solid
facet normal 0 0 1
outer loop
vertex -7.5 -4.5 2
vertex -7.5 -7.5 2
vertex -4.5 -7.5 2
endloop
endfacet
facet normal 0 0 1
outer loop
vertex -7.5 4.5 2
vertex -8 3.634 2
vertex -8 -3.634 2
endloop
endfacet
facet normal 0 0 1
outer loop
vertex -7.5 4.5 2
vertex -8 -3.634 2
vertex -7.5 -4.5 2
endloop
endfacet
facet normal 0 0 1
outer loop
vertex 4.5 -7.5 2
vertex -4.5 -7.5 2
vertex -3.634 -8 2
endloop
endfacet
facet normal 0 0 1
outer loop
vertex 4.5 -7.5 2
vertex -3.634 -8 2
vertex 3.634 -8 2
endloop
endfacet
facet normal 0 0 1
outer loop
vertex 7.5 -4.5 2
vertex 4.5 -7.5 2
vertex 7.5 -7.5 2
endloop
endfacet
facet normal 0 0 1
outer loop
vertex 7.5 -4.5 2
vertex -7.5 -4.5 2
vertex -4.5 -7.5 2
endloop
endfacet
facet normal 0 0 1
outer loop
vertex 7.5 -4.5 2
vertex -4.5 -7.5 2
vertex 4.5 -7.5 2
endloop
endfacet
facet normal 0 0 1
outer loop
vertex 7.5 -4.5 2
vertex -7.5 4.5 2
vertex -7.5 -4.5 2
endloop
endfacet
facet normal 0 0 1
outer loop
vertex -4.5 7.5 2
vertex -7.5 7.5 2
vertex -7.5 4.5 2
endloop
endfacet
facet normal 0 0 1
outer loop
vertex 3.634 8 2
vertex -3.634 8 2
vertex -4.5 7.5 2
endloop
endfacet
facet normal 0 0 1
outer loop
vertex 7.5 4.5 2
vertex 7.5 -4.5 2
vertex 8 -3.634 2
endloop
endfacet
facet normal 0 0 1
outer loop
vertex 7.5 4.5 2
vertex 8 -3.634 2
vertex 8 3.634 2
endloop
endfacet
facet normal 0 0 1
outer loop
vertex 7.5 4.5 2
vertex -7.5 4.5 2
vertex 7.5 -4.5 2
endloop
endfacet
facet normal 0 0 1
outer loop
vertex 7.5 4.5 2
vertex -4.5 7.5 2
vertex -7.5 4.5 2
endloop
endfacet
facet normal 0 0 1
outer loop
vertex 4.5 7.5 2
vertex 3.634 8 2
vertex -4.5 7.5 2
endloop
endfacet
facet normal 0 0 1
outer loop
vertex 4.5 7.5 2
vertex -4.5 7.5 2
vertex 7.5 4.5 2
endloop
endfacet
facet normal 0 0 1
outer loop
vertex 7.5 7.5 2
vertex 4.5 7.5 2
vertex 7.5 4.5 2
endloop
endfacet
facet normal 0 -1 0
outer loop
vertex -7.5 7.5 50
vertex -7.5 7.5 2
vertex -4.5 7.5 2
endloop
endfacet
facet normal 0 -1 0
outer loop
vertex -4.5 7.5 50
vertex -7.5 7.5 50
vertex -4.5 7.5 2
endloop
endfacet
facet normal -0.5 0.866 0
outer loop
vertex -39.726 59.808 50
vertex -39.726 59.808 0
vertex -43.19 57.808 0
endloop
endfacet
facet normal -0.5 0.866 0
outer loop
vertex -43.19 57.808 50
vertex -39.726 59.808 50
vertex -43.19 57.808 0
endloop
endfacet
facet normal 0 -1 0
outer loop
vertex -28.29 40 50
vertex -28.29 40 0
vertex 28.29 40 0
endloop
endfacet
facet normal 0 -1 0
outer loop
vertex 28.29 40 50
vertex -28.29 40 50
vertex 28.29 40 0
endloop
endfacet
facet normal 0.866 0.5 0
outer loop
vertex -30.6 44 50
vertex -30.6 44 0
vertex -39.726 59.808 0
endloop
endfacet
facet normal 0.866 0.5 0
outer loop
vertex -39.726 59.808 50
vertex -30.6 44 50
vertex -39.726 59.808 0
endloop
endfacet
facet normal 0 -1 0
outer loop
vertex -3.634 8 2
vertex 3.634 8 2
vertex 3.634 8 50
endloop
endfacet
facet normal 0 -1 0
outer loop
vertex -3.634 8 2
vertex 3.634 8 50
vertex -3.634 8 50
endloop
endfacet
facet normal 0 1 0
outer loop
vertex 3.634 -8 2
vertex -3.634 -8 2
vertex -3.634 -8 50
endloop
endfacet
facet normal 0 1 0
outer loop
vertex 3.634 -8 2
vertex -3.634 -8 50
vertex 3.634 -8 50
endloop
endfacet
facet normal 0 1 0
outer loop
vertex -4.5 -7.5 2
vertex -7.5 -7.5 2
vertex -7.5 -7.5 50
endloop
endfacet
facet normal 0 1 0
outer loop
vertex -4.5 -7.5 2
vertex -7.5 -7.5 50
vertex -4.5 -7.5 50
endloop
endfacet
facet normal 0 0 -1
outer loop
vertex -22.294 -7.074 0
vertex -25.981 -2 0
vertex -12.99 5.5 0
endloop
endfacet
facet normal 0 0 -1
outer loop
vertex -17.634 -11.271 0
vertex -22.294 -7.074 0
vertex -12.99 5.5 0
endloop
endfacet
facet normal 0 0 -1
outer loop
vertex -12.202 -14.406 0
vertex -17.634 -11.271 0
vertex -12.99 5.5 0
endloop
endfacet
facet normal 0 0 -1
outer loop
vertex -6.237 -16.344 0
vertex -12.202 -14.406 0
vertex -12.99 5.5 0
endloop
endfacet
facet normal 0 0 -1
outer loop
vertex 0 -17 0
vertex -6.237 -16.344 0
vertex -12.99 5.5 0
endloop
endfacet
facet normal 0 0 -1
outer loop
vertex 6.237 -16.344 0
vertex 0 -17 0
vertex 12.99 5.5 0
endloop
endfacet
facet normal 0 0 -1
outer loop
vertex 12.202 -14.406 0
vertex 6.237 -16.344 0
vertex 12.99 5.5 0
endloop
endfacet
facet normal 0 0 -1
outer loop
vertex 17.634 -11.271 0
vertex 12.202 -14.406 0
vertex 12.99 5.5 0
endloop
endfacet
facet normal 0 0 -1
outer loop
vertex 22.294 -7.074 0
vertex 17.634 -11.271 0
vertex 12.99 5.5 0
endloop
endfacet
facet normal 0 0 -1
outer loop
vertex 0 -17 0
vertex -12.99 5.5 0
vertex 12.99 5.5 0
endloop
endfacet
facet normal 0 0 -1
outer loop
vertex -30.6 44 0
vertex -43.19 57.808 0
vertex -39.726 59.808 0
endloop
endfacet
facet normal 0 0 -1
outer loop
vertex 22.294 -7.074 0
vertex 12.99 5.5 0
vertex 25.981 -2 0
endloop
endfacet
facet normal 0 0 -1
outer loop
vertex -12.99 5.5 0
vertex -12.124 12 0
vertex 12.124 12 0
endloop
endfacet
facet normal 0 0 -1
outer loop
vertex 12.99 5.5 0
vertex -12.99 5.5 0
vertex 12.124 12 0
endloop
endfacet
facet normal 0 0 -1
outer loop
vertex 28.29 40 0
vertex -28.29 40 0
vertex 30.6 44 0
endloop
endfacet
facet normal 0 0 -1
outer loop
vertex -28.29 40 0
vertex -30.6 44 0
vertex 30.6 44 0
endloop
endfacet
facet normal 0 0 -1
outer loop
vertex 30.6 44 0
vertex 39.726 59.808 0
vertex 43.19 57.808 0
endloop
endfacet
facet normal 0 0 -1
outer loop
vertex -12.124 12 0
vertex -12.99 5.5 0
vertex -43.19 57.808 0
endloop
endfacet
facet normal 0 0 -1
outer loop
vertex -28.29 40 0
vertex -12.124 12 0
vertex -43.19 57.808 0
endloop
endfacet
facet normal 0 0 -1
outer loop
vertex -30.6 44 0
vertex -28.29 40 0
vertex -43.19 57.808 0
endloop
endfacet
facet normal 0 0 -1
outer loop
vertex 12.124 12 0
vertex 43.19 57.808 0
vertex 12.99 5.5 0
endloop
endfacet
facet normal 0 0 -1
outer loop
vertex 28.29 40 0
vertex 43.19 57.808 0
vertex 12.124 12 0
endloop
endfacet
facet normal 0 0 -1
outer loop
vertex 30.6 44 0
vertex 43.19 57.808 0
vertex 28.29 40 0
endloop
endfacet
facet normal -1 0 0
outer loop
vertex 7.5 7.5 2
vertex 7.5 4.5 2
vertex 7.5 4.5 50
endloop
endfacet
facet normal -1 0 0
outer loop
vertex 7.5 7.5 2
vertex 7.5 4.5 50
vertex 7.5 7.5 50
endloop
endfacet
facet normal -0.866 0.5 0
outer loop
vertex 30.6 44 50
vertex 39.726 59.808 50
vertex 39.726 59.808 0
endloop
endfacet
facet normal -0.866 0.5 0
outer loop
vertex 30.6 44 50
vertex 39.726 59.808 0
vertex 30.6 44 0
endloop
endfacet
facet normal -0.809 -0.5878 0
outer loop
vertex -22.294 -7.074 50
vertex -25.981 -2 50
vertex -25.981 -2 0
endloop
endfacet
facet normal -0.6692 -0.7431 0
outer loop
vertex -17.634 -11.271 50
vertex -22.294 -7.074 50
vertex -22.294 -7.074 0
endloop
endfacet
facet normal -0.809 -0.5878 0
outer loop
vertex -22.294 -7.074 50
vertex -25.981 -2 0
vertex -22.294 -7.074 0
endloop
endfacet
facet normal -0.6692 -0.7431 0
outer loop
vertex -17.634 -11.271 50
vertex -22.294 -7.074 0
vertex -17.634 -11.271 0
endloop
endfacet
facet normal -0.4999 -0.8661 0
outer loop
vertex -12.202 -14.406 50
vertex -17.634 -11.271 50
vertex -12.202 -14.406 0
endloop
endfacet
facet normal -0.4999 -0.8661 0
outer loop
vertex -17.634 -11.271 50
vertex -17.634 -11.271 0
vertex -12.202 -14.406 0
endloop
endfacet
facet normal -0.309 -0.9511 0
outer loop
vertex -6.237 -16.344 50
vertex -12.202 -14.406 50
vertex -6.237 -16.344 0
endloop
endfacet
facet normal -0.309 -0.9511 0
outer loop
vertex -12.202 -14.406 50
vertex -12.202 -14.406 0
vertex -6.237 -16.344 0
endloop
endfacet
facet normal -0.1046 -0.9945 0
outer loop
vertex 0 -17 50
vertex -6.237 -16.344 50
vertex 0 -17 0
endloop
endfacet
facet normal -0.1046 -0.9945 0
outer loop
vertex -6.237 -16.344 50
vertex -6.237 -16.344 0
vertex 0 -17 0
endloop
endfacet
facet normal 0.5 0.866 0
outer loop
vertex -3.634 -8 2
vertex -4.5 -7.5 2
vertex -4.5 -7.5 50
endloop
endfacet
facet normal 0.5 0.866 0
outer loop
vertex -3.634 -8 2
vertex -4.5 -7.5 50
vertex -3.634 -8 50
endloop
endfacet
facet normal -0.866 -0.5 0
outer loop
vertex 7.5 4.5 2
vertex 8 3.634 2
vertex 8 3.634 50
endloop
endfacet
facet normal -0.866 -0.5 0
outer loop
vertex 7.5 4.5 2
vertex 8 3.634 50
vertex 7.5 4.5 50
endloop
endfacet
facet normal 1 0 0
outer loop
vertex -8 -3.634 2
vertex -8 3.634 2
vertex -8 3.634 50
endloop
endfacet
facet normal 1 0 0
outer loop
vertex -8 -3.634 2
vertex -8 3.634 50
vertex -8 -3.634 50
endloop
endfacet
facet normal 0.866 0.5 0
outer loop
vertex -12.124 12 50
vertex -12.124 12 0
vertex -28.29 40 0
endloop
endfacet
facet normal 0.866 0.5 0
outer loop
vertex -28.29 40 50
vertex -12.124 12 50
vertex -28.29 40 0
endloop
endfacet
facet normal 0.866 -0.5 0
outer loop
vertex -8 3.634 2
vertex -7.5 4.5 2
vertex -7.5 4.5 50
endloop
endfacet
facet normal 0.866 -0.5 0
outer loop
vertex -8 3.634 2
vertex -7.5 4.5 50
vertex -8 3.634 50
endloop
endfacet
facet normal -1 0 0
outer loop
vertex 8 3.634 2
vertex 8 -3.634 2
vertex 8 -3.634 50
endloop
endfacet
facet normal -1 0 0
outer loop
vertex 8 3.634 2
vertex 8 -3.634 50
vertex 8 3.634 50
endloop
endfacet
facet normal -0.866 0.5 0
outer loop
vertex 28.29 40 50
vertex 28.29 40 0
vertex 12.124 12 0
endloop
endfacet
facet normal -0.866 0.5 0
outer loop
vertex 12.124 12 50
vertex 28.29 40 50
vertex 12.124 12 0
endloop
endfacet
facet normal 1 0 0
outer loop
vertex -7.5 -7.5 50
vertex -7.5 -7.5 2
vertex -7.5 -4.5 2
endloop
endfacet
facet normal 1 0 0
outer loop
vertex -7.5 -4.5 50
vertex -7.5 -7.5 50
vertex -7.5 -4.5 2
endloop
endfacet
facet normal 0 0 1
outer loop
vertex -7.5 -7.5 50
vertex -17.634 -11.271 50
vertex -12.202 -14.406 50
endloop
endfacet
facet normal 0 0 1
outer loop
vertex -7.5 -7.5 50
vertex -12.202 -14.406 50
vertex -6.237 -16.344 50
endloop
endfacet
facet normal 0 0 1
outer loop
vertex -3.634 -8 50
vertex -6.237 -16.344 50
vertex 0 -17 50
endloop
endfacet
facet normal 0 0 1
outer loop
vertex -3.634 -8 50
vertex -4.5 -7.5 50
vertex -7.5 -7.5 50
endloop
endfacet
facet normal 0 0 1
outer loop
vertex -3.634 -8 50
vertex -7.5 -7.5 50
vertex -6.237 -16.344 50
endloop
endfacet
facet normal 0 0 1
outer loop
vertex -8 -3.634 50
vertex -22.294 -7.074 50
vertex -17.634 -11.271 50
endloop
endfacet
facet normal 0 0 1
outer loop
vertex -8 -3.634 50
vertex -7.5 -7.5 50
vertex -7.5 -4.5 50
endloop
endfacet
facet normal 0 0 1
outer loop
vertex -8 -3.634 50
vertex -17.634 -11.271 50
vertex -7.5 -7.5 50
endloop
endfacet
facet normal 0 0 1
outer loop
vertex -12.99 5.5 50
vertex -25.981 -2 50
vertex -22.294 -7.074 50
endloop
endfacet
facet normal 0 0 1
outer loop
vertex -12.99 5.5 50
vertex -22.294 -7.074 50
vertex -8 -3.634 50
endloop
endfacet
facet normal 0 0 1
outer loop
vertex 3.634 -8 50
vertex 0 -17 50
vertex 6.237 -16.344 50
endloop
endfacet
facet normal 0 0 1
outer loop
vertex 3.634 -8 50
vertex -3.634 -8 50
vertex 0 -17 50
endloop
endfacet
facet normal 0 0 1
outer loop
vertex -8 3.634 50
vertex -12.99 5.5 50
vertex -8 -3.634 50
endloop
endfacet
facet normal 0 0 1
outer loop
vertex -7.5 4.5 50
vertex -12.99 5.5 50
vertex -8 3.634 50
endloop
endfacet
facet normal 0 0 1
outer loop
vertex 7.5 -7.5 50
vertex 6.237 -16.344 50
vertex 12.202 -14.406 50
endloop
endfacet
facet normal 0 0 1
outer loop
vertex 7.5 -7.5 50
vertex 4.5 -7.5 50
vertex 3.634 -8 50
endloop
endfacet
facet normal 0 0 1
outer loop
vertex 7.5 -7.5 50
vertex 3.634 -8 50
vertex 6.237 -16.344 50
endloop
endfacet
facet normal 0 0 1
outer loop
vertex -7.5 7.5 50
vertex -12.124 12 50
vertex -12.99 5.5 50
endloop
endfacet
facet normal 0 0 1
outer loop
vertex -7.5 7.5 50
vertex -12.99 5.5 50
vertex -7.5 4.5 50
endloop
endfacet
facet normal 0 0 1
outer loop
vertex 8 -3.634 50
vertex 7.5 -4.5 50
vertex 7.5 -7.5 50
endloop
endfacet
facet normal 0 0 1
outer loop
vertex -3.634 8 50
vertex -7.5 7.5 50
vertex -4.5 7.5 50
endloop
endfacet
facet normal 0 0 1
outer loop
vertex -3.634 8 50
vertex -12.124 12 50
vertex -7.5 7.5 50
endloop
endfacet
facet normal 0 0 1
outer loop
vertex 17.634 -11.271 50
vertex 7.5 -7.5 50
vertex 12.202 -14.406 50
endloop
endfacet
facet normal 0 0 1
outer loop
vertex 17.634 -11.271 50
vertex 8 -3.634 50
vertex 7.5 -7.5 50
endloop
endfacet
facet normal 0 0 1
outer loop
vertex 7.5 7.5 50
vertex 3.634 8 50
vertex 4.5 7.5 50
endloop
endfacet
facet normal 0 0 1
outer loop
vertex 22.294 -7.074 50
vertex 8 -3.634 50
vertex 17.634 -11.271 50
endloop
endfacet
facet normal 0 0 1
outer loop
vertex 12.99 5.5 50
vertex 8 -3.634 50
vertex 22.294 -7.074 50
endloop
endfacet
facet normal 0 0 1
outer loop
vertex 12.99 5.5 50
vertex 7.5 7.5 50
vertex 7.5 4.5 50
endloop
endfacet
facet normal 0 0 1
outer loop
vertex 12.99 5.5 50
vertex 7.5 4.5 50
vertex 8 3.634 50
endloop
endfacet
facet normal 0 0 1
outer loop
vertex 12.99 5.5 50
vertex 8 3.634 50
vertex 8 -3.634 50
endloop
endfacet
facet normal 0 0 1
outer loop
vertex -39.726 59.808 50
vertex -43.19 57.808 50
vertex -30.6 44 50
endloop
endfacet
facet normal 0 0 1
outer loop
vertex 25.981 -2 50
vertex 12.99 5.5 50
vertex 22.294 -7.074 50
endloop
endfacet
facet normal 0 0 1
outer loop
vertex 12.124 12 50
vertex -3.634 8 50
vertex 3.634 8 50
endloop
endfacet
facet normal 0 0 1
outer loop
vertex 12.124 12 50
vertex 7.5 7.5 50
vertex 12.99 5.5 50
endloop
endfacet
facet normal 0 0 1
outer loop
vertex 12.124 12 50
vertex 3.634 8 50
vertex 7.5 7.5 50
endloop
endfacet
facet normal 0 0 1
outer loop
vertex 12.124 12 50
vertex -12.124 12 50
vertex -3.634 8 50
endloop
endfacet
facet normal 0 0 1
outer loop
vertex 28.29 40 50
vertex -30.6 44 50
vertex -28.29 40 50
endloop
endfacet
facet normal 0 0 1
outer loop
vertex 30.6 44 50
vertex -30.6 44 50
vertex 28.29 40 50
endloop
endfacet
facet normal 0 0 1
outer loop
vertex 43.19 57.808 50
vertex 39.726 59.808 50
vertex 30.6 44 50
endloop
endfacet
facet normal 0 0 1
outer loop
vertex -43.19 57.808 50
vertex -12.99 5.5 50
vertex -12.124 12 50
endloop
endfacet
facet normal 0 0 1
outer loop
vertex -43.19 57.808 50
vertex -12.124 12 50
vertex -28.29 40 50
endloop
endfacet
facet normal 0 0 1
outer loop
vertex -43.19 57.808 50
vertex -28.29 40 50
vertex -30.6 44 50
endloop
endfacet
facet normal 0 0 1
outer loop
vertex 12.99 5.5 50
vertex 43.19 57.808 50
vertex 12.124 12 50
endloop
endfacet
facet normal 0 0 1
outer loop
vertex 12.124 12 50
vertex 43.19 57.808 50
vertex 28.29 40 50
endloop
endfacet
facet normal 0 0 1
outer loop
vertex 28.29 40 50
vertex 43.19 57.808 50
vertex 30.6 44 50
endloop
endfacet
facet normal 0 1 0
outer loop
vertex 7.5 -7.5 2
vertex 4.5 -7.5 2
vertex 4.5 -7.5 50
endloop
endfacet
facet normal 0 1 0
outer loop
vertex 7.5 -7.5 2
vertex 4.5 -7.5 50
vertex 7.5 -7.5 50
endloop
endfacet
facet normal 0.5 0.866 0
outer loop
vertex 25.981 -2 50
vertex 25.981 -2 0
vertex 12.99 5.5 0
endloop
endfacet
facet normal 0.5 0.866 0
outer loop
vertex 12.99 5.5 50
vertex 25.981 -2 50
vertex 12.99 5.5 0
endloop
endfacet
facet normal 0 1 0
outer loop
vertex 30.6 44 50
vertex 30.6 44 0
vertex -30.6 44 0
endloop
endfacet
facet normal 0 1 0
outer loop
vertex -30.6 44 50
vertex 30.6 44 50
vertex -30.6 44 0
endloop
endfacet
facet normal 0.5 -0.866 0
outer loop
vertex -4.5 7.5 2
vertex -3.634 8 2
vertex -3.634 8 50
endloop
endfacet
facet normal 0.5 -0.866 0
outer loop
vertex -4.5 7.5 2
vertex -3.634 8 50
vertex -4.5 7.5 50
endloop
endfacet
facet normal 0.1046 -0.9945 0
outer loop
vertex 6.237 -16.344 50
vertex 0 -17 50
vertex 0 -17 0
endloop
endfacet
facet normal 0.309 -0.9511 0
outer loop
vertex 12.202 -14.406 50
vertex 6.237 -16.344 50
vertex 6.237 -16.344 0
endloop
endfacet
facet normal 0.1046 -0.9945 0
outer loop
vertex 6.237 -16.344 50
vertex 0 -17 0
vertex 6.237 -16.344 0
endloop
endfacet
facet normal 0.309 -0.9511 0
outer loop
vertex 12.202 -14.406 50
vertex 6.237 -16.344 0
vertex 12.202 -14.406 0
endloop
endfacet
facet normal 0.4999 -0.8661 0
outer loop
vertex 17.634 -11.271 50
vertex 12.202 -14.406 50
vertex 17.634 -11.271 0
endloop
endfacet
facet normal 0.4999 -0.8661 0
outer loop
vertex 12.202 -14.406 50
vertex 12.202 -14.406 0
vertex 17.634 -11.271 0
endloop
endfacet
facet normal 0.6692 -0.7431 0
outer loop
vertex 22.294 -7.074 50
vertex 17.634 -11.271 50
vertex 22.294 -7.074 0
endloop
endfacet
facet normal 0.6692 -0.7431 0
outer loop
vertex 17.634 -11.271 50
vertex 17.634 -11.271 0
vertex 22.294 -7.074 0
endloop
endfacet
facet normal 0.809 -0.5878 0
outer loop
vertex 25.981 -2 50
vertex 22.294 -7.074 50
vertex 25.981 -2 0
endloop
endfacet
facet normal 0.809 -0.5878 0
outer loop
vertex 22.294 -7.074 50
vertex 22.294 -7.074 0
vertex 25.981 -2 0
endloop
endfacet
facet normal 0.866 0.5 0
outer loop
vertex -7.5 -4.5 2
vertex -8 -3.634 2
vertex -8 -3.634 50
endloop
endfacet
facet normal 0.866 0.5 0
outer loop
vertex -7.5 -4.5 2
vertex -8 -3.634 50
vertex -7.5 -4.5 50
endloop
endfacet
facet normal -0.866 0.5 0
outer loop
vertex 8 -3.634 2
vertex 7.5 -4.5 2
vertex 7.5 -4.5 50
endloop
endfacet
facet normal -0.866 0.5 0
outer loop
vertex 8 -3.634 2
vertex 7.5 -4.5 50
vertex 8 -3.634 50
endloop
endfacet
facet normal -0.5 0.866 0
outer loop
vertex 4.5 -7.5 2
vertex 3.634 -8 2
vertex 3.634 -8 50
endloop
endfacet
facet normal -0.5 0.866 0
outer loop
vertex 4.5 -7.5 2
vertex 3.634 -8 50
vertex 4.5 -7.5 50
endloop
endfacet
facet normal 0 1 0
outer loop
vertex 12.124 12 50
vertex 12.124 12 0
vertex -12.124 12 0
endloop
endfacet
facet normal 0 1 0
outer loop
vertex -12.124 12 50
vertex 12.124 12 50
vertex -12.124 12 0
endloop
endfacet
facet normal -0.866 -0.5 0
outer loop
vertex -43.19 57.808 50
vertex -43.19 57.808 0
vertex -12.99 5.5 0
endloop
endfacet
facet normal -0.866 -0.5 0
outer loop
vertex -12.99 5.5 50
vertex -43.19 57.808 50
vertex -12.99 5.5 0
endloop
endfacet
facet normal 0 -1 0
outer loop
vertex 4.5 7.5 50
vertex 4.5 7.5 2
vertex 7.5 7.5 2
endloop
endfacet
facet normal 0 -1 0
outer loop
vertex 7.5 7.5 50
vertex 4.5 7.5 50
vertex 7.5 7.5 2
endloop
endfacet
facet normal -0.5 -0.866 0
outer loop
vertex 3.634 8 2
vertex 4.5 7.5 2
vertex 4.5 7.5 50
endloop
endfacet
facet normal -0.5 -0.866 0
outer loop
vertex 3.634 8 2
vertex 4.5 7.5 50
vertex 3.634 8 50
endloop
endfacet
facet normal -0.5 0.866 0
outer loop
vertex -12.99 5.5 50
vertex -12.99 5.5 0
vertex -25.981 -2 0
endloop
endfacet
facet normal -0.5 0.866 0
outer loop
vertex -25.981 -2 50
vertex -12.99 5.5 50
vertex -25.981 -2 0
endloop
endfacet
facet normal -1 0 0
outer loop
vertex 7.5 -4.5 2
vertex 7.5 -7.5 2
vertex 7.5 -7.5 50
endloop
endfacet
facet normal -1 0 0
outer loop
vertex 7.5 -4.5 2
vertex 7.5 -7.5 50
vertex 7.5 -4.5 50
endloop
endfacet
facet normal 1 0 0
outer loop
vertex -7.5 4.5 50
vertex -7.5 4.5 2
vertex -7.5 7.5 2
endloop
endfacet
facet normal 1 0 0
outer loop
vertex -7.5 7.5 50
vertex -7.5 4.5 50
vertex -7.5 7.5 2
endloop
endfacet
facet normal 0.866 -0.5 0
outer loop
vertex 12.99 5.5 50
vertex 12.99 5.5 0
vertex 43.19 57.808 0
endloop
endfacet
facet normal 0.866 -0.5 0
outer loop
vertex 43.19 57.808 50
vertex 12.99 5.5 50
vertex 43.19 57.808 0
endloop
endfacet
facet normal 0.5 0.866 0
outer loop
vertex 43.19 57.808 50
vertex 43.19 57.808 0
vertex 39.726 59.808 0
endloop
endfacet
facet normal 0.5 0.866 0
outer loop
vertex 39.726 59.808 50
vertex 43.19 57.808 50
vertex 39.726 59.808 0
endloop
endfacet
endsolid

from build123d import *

# Parameters (mm, degrees)
F0_W     = 15
F0_H     = 15
F1_DEPTH = 50
F2_W     = 15
F2_H     = 15
F3_DEPTH = 2
F5_DEPTH = 48.001


with BuildPart() as f1:
    # F0 (on Top) → F1 (new body)
    with BuildSketch(Plane.XY):
        with BuildLine():
            Line((-39.726279, 59.807934), (-43.190381, 57.807934))
            Line((-43.190381, 57.807934), (-12.990381, 5.5))
            Line((-12.990381, 5.5), (-25.980762, -2))
            ThreePointArc((-25.980762, -2), (-15, -12.980762), (0, -17))
            ThreePointArc((0, -17), (15, -12.980762), (25.980762, -2))
            Line((25.980762, -2), (12.990381, 5.5))
            Line((12.990381, 5.5), (43.190381, 57.807934))
            Line((43.190381, 57.807934), (39.726279, 59.807934))
            Line((39.726279, 59.807934), (30.599564, 44))
            Line((30.599564, 44), (0, 44))
            Line((0, 44), (-30.599564, 44))
            Line((-30.599564, 44), (-39.726279, 59.807934))
        make_face()
        Rectangle(F0_W, F0_H, mode=Mode.SUBTRACT)
        Polygon((-28.290163, 40), (28.290163, 40), (12.124356, 12), (-12.124356, 12), align=None, mode=Mode.SUBTRACT)
    extrude(amount=F1_DEPTH)

    # F2 (on Top) → F3 (join)
    with BuildSketch(Plane.XY):
        Rectangle(F2_W, F2_H)
    extrude(amount=F3_DEPTH)

    # F4 (on face) → F5 (cut, through all)
    with BuildSketch(Plane.XY.offset(2)):
        Polygon((7.5, 4.5), (7.5, -4.5), (8, -3.633975), (8, 3.633975), align=None)
        Polygon((-4.5, 7.5), (4.5, 7.5), (3.633975, 8), (-3.633975, 8), align=None)
        Polygon((-7.5, -4.5), (-7.5, 4.5), (-8, 3.633975), (-8, -3.633975), align=None)
        Polygon((4.5, -7.5), (-4.5, -7.5), (-3.633975, -8), (3.633975, -8), align=None)
    extrude(amount=F5_DEPTH, mode=Mode.SUBTRACT)


solid = f1.part
